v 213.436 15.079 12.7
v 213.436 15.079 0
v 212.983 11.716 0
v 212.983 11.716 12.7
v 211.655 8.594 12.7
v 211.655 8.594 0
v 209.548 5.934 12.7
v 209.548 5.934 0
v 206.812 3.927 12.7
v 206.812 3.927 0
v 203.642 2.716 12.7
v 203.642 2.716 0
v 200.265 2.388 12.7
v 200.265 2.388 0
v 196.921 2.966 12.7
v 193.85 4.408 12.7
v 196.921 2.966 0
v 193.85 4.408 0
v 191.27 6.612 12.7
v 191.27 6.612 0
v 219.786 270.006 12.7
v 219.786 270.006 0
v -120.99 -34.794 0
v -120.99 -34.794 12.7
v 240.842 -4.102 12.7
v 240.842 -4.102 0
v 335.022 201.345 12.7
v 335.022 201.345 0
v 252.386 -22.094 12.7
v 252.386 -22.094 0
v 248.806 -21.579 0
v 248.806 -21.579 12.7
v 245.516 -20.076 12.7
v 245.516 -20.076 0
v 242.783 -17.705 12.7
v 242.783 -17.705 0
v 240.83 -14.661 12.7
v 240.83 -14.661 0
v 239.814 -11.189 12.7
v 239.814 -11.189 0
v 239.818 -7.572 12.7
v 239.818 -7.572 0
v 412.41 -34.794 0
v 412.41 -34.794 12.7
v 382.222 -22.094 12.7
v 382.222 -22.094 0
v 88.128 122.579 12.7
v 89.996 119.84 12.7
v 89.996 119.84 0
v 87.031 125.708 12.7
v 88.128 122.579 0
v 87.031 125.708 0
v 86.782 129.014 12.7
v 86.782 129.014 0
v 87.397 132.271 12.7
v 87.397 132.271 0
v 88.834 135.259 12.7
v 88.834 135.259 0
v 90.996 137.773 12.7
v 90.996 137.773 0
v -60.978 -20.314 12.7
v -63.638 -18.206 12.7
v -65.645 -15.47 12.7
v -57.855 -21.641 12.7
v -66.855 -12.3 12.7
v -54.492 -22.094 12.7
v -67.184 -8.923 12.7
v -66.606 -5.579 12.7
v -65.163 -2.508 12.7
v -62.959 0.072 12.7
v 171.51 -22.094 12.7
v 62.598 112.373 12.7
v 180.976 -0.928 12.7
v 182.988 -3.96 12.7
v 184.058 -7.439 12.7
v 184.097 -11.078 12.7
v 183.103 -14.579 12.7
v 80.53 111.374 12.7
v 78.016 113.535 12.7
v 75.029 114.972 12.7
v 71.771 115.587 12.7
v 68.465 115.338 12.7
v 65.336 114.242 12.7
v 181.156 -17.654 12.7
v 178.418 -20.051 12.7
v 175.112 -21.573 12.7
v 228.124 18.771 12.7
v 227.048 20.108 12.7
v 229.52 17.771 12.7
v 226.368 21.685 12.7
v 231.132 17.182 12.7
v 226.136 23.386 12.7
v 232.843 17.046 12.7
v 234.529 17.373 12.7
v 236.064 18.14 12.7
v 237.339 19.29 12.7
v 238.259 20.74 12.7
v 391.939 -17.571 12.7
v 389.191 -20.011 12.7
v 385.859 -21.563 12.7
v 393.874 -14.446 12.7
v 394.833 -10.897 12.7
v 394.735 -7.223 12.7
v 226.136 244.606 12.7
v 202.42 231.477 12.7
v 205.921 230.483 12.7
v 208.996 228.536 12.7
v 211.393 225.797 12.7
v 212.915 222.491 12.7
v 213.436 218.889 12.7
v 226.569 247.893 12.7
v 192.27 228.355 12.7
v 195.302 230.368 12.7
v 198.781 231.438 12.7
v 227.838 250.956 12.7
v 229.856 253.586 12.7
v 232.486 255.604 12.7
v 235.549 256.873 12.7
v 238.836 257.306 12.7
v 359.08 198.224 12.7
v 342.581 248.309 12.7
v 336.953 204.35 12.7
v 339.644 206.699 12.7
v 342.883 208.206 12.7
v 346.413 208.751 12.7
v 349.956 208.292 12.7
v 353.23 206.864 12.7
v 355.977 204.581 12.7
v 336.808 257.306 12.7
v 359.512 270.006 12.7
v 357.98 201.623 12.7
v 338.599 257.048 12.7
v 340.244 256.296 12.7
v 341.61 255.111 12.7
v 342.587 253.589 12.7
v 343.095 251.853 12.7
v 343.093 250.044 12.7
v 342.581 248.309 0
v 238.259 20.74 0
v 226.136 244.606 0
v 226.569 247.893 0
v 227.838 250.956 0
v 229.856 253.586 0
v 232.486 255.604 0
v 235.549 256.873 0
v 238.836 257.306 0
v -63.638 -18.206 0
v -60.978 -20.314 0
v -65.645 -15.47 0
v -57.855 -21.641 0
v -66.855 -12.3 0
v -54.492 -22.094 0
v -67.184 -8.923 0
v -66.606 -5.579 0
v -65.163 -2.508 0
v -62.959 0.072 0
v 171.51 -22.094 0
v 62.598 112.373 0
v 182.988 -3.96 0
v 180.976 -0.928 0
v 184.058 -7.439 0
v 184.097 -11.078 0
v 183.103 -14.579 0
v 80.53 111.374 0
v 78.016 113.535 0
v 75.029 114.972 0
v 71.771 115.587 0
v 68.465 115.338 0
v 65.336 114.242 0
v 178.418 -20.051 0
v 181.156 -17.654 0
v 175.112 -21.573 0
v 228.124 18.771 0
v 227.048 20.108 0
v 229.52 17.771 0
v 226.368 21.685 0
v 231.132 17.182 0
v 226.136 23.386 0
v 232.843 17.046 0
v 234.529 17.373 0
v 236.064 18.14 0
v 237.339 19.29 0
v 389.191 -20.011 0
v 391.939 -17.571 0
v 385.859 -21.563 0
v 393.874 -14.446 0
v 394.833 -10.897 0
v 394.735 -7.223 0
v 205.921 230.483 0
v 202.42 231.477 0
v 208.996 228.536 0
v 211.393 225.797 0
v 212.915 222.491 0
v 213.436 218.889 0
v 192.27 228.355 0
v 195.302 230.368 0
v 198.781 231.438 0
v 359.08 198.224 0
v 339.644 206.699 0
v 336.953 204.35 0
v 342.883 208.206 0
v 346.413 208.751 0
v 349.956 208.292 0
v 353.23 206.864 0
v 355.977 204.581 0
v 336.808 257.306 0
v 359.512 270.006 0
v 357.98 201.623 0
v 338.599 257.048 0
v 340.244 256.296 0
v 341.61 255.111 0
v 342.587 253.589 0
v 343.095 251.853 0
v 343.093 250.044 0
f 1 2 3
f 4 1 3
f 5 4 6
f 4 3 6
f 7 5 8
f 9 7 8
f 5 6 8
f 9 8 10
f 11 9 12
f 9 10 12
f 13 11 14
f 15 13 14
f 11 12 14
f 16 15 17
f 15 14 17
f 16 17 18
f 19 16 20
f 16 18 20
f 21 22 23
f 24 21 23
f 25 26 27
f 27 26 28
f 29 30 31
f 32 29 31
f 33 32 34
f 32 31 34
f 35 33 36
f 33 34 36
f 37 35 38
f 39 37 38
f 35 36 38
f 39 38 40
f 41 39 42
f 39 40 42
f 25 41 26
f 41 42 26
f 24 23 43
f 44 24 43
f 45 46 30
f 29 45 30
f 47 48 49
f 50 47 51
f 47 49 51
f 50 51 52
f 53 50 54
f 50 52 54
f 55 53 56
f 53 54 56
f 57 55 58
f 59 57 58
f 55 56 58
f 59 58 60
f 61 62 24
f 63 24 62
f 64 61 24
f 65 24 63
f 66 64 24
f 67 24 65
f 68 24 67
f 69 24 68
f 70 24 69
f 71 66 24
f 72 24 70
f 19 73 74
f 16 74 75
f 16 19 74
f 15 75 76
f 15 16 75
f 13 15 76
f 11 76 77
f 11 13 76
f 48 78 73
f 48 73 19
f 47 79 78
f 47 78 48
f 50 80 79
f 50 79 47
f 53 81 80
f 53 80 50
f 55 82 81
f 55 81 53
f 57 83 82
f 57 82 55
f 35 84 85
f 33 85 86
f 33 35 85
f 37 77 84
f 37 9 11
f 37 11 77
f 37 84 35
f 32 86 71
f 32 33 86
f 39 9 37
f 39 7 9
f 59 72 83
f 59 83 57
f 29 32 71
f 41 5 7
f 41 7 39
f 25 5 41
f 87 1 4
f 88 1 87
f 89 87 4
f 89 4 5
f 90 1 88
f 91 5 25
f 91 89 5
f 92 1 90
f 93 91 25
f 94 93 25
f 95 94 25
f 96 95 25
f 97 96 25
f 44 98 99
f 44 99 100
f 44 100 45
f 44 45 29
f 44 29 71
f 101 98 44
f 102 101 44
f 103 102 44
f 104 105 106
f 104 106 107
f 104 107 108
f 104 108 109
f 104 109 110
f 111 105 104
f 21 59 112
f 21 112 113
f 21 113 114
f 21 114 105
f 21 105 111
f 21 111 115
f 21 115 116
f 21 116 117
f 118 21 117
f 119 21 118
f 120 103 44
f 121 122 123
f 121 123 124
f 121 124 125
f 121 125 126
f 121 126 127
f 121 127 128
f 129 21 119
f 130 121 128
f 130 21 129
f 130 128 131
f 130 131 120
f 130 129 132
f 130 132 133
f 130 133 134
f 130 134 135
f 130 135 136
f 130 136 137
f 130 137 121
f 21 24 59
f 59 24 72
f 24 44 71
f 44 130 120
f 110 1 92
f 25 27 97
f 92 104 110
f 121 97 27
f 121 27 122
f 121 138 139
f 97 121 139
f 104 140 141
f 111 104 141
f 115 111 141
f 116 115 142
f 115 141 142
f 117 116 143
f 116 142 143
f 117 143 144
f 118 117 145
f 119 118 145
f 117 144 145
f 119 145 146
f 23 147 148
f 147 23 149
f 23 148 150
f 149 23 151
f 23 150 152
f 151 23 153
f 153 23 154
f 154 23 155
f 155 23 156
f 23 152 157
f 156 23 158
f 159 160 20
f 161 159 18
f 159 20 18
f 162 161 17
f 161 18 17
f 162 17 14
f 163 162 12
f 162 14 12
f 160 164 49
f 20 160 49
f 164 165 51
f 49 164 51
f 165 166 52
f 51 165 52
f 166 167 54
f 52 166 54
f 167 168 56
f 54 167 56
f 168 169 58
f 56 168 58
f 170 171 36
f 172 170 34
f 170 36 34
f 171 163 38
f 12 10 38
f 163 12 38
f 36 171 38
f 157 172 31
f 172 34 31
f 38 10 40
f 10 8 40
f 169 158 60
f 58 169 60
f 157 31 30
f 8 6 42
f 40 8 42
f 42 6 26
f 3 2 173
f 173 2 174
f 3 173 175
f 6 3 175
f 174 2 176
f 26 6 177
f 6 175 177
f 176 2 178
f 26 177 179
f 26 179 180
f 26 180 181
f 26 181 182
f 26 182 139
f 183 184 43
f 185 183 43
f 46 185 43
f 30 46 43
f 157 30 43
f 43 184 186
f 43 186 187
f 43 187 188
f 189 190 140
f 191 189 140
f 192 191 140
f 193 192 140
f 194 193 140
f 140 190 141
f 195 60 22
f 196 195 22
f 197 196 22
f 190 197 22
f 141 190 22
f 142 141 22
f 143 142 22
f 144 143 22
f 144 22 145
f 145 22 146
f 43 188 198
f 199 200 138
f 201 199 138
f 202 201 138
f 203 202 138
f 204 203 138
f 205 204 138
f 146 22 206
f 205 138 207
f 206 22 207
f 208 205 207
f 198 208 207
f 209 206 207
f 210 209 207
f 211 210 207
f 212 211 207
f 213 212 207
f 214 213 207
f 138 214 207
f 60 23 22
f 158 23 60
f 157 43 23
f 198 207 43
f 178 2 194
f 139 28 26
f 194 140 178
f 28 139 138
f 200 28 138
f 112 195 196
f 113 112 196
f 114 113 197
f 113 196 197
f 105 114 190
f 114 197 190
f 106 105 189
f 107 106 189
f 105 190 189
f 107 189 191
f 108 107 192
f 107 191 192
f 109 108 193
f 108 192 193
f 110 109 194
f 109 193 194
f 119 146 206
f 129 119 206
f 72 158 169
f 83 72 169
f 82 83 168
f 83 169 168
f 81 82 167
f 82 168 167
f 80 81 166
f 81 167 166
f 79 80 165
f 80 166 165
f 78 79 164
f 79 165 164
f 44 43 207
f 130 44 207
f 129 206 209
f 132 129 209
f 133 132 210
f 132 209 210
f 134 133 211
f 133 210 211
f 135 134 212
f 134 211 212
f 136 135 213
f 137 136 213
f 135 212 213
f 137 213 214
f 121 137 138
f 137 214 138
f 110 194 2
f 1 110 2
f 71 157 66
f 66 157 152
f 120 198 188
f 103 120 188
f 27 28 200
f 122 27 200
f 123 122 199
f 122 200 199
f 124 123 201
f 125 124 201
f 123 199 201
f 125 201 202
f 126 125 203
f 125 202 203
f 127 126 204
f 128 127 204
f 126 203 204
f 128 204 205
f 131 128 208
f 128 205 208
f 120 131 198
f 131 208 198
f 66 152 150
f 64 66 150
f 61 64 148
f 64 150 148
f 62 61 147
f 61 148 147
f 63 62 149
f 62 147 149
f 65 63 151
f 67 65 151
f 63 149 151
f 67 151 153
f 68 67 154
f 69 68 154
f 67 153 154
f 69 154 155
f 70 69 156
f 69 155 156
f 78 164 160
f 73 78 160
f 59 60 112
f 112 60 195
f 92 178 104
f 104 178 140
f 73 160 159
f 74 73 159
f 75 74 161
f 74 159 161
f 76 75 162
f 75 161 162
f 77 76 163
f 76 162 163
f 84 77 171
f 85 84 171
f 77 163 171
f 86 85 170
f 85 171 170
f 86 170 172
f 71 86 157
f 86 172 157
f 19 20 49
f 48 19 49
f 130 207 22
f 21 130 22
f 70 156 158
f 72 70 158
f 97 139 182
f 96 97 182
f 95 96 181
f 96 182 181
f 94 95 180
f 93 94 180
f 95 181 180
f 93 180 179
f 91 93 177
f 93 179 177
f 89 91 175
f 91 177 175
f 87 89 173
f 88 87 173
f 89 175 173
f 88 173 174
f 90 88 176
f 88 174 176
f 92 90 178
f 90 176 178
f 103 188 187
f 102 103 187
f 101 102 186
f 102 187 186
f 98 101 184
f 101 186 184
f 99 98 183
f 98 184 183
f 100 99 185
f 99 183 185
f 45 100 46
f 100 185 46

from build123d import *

# Parameters (mm, degrees)
F1_DEPTH = 12.7


with BuildPart() as f1:
    # F0 (on Top) → F1 (new body)
    with BuildSketch(Plane.XY):
        Polygon((219.786288, 270.0056), (-120.990471, -34.7944), (412.409529, -34.7944), (359.51203, 270.0056), align=None)
        with BuildLine():
            ThreePointArc((-54.492408, -22.0944), (-66.356397, -13.92604), (-62.959075, 0.071621))
            Line((-62.959075, 0.071621), (62.597587, 112.372913))
            ThreePointArc((62.597587, 112.372913), (71.770904, 115.587217), (80.530275, 111.373559))
            Line((80.530275, 111.373559), (180.975604, -0.927733))
            ThreePointArc((180.975604, -0.927733), (183.103044, -14.579153), (171.509583, -22.0944))
            Line((171.509583, -22.0944), (-54.492408, -22.0944))
        make_face(mode=Mode.SUBTRACT)
        with BuildLine():
            ThreePointArc((213.436288, 15.079148), (205.267929, 3.215159), (191.270267, 6.612481))
            Line((191.270267, 6.612481), (89.996295, 119.840225))
            ThreePointArc((89.996295, 119.840225), (86.781991, 129.013542), (90.995649, 137.772912))
            Line((90.995649, 137.772912), (192.269622, 228.355107))
            ThreePointArc((192.269622, 228.355107), (205.921042, 230.482547), (213.436288, 218.889086))
            Line((213.436288, 218.889086), (213.436288, 15.079148))
        make_face(mode=Mode.SUBTRACT)
        with BuildLine():
            ThreePointArc((335.022059, 201.344663), (348.200544, 208.646823), (359.079772, 198.223945))
            Line((359.079772, 198.223945), (394.734689, -7.222798))
            ThreePointArc((394.734689, -7.222798), (391.939481, -17.570911), (382.22173, -22.0944))
            Line((382.22173, -22.0944), (252.386372, -22.0944))
            ThreePointArc((252.386372, -22.0944), (241.697535, -16.252881), (240.841618, -4.102079))
            Line((240.841618, -4.102079), (335.022059, 201.344663))
        make_face(mode=Mode.SUBTRACT)
        with BuildLine():
            ThreePointArc((226.13628, 244.6056), (229.856024, 253.585856), (238.83628, 257.3056))
            Line((238.83628, 257.3056), (336.808323, 257.3056))
            ThreePointArc((336.808323, 257.3056), (342.152742, 254.384841), (342.5807, 248.30944))
            Line((342.5807, 248.30944), (238.258657, 20.739642))
            ThreePointArc((238.258657, 20.739642), (231.132045, 17.181889), (226.13628, 23.385803))
            Line((226.13628, 23.385803), (226.13628, 244.6056))
        make_face(mode=Mode.SUBTRACT)
    extrude(amount=F1_DEPTH)


solid = f1.part
